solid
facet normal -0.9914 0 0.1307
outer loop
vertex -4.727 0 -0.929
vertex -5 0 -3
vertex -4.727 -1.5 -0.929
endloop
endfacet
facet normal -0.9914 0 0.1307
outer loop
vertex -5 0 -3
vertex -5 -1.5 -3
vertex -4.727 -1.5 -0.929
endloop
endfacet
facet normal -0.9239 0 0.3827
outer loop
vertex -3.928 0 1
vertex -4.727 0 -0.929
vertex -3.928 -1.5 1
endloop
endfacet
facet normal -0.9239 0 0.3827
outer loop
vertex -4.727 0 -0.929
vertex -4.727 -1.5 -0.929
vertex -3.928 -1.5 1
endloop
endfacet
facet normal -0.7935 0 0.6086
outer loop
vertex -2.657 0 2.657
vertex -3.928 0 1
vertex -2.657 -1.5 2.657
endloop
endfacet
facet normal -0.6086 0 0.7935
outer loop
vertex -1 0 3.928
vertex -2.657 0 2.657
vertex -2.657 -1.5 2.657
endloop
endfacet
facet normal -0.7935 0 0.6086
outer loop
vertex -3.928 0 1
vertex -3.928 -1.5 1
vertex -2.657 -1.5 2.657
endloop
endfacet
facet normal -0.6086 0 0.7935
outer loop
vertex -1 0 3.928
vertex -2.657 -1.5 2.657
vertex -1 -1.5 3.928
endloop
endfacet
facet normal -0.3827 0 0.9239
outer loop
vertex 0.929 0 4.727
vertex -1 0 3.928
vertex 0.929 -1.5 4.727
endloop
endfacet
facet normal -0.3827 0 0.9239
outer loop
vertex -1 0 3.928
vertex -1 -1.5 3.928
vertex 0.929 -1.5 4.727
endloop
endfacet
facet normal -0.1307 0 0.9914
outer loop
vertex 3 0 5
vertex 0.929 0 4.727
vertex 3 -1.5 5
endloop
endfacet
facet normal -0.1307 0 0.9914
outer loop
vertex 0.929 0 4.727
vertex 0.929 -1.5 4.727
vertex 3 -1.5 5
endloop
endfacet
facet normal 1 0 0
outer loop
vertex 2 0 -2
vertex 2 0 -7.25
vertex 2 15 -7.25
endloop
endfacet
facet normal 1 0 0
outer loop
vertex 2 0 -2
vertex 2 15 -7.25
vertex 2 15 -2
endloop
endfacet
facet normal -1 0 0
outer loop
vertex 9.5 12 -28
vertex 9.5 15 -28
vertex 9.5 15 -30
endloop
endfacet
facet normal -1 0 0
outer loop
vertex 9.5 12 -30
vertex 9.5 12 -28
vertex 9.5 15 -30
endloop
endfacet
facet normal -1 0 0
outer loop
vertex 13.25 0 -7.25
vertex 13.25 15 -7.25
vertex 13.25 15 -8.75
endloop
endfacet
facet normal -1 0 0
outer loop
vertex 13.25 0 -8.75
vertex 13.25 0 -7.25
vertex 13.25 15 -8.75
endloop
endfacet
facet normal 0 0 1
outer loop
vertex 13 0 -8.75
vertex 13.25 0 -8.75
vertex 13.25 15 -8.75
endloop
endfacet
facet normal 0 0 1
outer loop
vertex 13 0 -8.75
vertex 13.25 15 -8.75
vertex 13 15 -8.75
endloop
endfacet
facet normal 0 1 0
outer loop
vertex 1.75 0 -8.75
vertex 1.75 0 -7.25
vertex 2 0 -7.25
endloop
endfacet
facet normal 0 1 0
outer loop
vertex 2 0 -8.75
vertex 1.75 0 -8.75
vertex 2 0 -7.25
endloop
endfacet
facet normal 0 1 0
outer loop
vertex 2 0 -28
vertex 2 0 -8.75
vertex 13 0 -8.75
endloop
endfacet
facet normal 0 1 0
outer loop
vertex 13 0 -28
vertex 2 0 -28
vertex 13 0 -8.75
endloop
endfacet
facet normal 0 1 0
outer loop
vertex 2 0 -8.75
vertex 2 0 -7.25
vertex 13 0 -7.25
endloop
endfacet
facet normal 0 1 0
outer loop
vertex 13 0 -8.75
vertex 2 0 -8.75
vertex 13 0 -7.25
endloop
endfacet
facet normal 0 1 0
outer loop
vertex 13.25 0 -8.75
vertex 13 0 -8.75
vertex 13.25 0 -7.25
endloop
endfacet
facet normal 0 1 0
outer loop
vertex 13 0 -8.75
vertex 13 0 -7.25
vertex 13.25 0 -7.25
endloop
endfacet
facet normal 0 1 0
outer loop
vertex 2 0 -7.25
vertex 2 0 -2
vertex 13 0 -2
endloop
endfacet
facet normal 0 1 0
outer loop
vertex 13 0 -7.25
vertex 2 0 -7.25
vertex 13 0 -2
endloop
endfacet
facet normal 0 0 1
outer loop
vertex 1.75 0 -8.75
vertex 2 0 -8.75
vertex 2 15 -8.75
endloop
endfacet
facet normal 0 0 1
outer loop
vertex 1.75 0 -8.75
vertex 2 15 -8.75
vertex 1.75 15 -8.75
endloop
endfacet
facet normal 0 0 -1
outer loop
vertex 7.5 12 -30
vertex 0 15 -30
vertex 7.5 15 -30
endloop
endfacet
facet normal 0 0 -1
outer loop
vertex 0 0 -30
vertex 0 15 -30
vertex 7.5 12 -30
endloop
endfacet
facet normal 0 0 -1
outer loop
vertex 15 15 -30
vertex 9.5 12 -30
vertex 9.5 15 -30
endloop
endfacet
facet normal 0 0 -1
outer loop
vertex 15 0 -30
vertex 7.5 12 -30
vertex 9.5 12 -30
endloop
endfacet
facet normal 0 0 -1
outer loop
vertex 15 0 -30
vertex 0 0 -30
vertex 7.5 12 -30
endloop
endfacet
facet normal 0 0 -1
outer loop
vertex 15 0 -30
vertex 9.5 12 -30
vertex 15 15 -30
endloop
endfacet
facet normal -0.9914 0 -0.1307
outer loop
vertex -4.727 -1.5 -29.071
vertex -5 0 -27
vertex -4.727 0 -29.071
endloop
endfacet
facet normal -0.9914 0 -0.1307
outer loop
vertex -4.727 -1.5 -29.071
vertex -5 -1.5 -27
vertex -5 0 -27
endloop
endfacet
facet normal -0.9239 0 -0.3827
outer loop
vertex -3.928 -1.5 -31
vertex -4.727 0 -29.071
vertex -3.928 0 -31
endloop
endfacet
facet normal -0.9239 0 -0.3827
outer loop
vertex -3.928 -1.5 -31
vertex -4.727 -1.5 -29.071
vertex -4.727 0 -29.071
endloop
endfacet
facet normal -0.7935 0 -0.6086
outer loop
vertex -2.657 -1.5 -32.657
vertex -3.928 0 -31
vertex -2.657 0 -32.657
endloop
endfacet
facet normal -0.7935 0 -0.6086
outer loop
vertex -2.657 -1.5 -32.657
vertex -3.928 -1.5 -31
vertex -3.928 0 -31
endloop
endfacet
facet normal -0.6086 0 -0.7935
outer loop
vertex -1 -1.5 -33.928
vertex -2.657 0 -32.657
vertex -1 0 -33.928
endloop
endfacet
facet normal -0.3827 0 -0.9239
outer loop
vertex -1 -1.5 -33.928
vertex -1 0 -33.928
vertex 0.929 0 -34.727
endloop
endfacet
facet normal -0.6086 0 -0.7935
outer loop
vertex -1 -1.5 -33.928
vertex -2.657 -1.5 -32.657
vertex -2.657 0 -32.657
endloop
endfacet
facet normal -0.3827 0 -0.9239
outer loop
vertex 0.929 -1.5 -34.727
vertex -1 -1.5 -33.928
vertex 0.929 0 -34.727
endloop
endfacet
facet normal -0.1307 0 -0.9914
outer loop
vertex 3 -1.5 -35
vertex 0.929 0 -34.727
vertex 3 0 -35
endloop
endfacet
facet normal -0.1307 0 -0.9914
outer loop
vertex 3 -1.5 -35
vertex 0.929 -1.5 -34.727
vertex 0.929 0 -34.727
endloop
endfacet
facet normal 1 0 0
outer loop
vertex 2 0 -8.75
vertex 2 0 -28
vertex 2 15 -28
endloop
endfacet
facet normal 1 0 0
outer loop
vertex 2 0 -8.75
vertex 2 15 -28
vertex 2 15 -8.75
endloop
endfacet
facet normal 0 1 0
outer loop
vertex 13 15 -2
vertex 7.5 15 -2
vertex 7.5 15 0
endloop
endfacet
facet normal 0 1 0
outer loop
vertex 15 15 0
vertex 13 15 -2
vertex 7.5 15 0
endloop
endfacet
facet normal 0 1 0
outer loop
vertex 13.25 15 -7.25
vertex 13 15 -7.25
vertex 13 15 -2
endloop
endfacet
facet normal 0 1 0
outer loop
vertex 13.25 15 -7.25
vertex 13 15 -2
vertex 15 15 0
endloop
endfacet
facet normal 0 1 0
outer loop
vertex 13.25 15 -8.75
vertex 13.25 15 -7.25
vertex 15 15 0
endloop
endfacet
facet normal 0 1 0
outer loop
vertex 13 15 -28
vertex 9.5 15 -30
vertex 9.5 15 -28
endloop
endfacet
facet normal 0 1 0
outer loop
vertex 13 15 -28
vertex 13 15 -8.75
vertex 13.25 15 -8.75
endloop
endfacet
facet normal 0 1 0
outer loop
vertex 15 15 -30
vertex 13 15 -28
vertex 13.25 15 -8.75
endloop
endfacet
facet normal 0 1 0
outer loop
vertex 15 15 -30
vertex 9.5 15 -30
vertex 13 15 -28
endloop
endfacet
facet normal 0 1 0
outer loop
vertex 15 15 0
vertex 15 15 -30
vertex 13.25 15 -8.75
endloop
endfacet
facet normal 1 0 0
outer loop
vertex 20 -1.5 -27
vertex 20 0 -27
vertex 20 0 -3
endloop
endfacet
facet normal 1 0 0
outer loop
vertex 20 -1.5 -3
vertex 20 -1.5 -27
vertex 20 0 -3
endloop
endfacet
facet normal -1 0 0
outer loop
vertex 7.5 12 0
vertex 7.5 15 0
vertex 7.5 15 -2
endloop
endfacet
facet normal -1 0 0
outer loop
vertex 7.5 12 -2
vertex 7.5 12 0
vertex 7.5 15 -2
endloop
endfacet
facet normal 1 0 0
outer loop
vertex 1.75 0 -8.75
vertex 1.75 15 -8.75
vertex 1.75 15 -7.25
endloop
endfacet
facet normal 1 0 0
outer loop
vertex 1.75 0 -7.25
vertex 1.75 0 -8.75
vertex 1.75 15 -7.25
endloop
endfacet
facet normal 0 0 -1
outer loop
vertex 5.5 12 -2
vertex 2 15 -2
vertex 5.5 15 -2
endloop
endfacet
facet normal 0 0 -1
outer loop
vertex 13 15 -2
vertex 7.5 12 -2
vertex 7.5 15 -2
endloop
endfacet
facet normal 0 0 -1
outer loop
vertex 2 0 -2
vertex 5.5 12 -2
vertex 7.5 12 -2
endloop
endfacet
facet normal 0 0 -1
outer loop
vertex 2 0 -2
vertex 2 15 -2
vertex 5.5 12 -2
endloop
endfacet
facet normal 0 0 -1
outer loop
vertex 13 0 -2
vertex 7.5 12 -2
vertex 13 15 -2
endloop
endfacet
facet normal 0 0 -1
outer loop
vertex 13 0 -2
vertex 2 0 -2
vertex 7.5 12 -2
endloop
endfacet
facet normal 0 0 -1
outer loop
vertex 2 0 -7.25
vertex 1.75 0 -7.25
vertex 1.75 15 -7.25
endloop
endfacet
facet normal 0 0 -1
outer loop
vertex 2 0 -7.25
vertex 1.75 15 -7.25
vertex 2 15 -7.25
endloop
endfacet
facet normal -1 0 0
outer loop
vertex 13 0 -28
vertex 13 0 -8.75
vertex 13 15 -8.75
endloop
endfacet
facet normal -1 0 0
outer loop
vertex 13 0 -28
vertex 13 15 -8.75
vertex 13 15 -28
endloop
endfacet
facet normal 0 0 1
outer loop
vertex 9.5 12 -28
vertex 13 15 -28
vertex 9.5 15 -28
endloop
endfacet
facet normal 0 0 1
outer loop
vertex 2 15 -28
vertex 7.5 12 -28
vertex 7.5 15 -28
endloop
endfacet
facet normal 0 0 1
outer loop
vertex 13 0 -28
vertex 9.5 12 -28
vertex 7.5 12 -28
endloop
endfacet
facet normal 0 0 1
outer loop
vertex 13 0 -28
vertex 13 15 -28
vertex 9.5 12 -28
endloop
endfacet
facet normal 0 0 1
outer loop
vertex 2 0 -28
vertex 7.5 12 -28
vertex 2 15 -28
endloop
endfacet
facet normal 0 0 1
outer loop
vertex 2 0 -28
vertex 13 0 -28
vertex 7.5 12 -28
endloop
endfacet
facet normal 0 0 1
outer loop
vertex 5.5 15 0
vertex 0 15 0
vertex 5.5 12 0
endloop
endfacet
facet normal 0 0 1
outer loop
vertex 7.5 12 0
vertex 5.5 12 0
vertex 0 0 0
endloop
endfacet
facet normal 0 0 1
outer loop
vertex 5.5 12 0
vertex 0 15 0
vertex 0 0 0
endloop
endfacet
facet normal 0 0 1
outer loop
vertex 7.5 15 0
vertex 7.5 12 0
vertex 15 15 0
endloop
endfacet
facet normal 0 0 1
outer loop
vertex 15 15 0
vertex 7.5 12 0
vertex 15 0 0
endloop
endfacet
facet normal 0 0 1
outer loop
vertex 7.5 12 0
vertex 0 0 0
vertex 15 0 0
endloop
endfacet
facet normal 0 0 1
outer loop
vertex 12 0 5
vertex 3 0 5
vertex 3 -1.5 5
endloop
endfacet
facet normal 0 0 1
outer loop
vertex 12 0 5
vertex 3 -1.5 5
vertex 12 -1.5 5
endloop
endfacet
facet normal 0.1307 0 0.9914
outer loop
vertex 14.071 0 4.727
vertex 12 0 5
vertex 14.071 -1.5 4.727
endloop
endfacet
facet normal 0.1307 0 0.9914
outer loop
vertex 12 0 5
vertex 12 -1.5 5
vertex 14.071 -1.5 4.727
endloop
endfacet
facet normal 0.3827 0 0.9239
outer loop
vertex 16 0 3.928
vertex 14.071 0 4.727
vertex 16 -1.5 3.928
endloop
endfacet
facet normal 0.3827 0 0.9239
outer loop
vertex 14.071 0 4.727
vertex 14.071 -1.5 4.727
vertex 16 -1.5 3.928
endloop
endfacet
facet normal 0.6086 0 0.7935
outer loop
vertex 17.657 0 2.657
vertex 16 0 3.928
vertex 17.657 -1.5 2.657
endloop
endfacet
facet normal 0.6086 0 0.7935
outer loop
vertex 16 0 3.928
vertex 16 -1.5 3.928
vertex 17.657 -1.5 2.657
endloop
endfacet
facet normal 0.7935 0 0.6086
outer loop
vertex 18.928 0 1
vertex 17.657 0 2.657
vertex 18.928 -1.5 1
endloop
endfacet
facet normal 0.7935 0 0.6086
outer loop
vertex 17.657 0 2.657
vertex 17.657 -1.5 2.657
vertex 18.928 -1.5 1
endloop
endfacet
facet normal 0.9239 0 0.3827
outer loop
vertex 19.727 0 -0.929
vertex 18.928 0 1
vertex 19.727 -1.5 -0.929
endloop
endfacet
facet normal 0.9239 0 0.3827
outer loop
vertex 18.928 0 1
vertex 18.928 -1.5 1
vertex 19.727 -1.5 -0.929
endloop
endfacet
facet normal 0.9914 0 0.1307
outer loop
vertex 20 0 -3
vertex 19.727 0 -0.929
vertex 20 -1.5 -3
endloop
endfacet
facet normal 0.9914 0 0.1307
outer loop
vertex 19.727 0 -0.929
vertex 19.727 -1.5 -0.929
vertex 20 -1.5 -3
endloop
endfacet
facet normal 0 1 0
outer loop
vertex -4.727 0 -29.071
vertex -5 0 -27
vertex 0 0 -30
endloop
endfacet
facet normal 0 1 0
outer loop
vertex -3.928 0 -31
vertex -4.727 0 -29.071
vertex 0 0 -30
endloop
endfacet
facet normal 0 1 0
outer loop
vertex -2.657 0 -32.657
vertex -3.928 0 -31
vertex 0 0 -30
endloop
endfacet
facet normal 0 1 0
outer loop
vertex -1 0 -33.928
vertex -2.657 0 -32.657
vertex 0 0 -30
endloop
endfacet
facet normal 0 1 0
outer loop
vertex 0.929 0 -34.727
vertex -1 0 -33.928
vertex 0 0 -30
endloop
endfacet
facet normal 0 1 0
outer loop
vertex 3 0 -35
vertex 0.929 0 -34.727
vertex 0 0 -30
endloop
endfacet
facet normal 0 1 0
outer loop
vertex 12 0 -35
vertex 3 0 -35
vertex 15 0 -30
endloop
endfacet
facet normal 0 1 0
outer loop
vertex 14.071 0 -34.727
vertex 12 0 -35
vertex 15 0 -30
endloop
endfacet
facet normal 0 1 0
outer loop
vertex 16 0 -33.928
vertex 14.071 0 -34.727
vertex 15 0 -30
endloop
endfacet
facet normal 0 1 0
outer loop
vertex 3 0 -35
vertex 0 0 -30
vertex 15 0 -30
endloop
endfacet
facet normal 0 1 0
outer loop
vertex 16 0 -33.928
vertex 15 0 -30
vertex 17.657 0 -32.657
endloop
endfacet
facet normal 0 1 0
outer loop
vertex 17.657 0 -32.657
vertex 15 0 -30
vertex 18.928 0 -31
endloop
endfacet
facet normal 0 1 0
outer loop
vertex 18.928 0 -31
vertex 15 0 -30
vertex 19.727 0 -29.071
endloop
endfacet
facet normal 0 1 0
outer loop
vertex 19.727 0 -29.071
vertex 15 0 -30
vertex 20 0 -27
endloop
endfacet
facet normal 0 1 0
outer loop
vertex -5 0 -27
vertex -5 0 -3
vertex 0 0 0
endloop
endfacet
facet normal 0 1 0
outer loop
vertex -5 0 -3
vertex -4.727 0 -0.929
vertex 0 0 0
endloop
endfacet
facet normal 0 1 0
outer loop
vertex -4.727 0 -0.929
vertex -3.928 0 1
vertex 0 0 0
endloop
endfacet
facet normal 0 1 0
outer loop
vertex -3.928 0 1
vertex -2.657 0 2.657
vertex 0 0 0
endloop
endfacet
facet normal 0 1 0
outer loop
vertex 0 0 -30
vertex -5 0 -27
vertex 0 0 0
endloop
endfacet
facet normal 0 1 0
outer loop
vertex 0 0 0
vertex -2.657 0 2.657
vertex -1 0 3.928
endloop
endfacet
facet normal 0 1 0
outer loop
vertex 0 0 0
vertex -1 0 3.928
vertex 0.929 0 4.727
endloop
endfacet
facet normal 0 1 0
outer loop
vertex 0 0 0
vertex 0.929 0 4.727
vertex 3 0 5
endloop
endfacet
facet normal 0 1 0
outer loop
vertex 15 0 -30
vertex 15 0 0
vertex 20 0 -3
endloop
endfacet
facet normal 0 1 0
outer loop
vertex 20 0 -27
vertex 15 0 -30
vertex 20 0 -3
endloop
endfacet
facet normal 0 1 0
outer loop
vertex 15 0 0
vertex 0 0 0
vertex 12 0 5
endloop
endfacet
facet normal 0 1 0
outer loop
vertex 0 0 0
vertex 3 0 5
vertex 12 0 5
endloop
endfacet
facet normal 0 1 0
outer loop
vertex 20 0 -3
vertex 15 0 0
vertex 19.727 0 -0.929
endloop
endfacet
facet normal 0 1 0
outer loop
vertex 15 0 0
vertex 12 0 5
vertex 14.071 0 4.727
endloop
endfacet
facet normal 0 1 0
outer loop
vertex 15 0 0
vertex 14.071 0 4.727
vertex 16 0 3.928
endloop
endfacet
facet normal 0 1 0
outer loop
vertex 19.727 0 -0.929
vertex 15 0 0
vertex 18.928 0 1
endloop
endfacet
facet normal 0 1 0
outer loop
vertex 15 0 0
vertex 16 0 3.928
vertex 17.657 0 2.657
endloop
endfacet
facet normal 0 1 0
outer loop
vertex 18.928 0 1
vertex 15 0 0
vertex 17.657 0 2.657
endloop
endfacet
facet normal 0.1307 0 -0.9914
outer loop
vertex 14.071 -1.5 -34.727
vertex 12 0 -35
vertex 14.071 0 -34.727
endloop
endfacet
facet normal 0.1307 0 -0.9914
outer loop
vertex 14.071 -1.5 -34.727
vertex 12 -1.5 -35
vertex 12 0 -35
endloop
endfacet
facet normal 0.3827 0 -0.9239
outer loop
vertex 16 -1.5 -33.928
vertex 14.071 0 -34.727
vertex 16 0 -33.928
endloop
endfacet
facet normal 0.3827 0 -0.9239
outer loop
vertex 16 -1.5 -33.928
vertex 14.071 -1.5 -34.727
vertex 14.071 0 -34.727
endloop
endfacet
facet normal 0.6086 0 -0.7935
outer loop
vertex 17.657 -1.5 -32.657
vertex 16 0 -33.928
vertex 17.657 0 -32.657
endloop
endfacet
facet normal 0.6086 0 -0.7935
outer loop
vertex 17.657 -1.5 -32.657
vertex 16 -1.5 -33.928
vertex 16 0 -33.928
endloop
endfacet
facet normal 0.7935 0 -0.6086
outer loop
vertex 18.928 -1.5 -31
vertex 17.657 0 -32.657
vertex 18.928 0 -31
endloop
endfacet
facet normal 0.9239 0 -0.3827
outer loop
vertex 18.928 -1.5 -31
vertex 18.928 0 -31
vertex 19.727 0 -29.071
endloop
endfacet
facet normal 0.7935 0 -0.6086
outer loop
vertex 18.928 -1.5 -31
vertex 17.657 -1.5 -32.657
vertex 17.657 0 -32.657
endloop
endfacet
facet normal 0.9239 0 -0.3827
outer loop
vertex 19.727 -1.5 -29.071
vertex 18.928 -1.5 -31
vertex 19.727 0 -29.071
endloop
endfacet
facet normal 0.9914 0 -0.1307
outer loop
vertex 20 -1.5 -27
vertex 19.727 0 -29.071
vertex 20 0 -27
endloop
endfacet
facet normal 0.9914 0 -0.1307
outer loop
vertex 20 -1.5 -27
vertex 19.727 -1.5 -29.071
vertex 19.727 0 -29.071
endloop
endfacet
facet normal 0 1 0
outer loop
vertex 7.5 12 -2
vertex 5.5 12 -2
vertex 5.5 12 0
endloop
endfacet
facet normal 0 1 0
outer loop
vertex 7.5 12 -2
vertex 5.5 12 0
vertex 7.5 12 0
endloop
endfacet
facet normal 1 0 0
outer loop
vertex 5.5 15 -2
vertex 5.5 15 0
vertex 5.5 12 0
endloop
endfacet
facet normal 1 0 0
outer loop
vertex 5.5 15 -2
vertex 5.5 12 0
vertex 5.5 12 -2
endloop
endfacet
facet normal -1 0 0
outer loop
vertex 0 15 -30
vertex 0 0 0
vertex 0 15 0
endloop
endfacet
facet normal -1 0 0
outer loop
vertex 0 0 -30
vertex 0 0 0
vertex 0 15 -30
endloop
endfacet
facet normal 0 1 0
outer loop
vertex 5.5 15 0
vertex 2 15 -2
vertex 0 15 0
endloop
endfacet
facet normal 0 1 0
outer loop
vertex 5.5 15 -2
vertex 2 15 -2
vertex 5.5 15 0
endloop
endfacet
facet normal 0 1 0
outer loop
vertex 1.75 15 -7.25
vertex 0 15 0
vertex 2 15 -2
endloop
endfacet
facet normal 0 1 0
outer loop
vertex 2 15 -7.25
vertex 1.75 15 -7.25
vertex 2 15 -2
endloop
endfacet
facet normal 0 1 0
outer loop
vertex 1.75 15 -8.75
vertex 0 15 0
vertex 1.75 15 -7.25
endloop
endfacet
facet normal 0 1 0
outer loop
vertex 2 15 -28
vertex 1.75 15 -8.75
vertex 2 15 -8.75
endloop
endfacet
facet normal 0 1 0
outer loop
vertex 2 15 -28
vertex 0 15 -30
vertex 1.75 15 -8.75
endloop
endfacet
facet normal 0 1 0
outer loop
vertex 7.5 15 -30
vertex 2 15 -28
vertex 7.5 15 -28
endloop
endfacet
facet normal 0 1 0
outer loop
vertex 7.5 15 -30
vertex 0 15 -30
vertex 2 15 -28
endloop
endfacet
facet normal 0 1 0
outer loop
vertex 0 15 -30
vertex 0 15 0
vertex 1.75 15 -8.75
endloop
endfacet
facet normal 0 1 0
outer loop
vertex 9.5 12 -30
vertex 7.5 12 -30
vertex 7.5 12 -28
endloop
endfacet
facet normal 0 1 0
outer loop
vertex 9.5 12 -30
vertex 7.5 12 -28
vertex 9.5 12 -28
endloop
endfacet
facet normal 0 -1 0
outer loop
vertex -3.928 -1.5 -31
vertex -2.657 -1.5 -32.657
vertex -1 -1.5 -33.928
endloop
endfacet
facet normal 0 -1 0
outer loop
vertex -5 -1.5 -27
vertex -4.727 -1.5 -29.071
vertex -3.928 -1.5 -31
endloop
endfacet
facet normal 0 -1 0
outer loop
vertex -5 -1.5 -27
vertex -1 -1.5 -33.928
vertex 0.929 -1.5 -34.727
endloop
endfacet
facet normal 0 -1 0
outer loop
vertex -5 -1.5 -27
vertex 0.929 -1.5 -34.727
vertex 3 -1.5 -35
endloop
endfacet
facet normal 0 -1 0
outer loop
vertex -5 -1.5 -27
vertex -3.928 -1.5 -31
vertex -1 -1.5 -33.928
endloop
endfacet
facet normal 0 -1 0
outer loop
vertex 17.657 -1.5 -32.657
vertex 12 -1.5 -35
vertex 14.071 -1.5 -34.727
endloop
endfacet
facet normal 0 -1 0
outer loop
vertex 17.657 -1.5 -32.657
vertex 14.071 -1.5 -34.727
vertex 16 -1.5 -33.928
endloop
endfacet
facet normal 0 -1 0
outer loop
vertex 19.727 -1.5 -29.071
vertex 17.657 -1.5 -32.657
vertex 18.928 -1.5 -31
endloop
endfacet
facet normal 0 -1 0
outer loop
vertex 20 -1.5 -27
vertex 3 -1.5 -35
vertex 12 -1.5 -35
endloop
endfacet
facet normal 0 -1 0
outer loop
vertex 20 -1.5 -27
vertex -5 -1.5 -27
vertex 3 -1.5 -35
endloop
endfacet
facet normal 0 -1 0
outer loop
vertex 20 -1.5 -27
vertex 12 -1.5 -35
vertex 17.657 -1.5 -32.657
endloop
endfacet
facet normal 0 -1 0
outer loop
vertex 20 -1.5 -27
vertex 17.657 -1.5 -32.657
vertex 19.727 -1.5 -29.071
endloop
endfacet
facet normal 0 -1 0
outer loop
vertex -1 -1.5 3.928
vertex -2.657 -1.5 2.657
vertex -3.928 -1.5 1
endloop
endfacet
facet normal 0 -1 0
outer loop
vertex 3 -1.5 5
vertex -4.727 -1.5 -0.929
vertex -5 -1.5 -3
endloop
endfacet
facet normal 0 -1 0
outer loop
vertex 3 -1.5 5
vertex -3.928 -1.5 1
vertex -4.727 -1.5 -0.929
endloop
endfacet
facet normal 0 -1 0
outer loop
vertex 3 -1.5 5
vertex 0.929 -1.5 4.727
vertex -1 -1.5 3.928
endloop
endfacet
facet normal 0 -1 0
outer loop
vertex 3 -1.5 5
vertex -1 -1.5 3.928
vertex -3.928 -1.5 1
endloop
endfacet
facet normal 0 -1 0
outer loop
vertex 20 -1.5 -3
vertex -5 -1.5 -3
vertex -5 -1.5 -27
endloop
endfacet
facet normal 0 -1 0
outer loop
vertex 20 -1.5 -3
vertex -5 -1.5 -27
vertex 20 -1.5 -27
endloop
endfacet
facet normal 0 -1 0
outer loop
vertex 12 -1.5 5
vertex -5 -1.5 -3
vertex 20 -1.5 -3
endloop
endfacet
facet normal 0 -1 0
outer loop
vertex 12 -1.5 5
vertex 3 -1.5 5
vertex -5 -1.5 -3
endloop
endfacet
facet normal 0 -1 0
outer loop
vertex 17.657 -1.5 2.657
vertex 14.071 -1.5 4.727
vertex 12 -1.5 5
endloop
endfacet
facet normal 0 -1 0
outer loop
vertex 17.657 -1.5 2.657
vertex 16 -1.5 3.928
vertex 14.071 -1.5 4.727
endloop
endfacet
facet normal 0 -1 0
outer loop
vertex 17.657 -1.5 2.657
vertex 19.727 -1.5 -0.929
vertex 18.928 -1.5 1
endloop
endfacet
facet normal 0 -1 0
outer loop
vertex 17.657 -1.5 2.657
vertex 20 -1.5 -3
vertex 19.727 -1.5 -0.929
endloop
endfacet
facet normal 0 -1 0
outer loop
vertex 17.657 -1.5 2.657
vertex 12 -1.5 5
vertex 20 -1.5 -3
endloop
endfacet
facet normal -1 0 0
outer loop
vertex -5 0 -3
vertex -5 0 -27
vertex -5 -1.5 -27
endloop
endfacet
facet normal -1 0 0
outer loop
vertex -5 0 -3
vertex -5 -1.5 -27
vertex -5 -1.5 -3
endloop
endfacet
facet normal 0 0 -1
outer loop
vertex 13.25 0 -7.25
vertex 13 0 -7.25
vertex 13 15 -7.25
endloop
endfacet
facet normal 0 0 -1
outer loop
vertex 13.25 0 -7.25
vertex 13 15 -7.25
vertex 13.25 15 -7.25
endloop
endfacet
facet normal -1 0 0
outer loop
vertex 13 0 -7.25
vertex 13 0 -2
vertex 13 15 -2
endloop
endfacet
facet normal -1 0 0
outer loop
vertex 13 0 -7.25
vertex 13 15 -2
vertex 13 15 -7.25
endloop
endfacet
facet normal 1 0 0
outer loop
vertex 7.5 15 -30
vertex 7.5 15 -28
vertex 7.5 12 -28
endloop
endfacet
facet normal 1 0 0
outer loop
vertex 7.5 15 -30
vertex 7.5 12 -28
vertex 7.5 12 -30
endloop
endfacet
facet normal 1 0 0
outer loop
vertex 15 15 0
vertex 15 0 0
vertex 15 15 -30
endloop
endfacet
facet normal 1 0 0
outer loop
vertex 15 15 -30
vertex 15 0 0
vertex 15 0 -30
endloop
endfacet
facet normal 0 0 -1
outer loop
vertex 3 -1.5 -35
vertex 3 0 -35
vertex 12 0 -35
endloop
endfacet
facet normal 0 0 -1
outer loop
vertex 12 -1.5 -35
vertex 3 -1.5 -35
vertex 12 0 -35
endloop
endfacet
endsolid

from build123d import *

# Parameters (mm, degrees)
SKETCH1_W           = 15
SKETCH1_H           = 30
BOSS_EXTRUDE1_DEPTH = 15
SKETCH2_W           = 25
SKETCH2_H           = 40
BOSS_EXTRUDE2_DEPTH = 1.5
SKETCH4_W           = 2
SKETCH4_H           = 2
CUT_EXTRUDE2_DEPTH  = 3
FILLET2_R           = 8


with BuildPart() as part:
    # Sketch1 → Boss-Extrude1 (new body)
    with BuildSketch(Plane(origin=(0, 0, 0), x_dir=(1, 0, 0), z_dir=(0, 1, 0))):
        with Locations((7.5, 15)):
            Rectangle(SKETCH1_W, SKETCH1_H)
        Polygon((2, 2), (13, 2), (13, 7.25), (13.25, 7.25), (13.25, 8.75), (13, 8.75), (13, 28), (2, 28), (2, 8.75), (1.75, 8.75), (1.75, 7.25), (2, 7.25), align=None, mode=Mode.SUBTRACT)
    extrude(amount=BOSS_EXTRUDE1_DEPTH)

    # Sketch2 → Boss-Extrude2 (add)
    with BuildSketch(Plane.XZ):
        with Locations((7.5, -15)):
            Rectangle(SKETCH2_W, SKETCH2_H)
    extrude(amount=BOSS_EXTRUDE2_DEPTH)

    # Sketch4 → Cut-Extrude2 (cut)
    with BuildSketch(Plane(origin=(0, 15, 0), x_dir=(1, 0, 0), z_dir=(0, 1, 0))):
        with Locations((8.5, 29)):
            Rectangle(SKETCH4_W, SKETCH4_H)
        with Locations((6.5, 1)):
            Rectangle(SKETCH4_W, SKETCH4_H)
    extrude(amount=-CUT_EXTRUDE2_DEPTH, mode=Mode.SUBTRACT)

    # Fillet2
    fillet2_edges = [part.edges().sort_by_distance(p)[0] for p in [
        (-5, -0.75, 5),
        (-5, -0.75, -35),
        (20, -0.75, -35),
        (20, -0.75, 5),
    ]]
    fillet(fillet2_edges, radius=FILLET2_R)


solid = part.part
